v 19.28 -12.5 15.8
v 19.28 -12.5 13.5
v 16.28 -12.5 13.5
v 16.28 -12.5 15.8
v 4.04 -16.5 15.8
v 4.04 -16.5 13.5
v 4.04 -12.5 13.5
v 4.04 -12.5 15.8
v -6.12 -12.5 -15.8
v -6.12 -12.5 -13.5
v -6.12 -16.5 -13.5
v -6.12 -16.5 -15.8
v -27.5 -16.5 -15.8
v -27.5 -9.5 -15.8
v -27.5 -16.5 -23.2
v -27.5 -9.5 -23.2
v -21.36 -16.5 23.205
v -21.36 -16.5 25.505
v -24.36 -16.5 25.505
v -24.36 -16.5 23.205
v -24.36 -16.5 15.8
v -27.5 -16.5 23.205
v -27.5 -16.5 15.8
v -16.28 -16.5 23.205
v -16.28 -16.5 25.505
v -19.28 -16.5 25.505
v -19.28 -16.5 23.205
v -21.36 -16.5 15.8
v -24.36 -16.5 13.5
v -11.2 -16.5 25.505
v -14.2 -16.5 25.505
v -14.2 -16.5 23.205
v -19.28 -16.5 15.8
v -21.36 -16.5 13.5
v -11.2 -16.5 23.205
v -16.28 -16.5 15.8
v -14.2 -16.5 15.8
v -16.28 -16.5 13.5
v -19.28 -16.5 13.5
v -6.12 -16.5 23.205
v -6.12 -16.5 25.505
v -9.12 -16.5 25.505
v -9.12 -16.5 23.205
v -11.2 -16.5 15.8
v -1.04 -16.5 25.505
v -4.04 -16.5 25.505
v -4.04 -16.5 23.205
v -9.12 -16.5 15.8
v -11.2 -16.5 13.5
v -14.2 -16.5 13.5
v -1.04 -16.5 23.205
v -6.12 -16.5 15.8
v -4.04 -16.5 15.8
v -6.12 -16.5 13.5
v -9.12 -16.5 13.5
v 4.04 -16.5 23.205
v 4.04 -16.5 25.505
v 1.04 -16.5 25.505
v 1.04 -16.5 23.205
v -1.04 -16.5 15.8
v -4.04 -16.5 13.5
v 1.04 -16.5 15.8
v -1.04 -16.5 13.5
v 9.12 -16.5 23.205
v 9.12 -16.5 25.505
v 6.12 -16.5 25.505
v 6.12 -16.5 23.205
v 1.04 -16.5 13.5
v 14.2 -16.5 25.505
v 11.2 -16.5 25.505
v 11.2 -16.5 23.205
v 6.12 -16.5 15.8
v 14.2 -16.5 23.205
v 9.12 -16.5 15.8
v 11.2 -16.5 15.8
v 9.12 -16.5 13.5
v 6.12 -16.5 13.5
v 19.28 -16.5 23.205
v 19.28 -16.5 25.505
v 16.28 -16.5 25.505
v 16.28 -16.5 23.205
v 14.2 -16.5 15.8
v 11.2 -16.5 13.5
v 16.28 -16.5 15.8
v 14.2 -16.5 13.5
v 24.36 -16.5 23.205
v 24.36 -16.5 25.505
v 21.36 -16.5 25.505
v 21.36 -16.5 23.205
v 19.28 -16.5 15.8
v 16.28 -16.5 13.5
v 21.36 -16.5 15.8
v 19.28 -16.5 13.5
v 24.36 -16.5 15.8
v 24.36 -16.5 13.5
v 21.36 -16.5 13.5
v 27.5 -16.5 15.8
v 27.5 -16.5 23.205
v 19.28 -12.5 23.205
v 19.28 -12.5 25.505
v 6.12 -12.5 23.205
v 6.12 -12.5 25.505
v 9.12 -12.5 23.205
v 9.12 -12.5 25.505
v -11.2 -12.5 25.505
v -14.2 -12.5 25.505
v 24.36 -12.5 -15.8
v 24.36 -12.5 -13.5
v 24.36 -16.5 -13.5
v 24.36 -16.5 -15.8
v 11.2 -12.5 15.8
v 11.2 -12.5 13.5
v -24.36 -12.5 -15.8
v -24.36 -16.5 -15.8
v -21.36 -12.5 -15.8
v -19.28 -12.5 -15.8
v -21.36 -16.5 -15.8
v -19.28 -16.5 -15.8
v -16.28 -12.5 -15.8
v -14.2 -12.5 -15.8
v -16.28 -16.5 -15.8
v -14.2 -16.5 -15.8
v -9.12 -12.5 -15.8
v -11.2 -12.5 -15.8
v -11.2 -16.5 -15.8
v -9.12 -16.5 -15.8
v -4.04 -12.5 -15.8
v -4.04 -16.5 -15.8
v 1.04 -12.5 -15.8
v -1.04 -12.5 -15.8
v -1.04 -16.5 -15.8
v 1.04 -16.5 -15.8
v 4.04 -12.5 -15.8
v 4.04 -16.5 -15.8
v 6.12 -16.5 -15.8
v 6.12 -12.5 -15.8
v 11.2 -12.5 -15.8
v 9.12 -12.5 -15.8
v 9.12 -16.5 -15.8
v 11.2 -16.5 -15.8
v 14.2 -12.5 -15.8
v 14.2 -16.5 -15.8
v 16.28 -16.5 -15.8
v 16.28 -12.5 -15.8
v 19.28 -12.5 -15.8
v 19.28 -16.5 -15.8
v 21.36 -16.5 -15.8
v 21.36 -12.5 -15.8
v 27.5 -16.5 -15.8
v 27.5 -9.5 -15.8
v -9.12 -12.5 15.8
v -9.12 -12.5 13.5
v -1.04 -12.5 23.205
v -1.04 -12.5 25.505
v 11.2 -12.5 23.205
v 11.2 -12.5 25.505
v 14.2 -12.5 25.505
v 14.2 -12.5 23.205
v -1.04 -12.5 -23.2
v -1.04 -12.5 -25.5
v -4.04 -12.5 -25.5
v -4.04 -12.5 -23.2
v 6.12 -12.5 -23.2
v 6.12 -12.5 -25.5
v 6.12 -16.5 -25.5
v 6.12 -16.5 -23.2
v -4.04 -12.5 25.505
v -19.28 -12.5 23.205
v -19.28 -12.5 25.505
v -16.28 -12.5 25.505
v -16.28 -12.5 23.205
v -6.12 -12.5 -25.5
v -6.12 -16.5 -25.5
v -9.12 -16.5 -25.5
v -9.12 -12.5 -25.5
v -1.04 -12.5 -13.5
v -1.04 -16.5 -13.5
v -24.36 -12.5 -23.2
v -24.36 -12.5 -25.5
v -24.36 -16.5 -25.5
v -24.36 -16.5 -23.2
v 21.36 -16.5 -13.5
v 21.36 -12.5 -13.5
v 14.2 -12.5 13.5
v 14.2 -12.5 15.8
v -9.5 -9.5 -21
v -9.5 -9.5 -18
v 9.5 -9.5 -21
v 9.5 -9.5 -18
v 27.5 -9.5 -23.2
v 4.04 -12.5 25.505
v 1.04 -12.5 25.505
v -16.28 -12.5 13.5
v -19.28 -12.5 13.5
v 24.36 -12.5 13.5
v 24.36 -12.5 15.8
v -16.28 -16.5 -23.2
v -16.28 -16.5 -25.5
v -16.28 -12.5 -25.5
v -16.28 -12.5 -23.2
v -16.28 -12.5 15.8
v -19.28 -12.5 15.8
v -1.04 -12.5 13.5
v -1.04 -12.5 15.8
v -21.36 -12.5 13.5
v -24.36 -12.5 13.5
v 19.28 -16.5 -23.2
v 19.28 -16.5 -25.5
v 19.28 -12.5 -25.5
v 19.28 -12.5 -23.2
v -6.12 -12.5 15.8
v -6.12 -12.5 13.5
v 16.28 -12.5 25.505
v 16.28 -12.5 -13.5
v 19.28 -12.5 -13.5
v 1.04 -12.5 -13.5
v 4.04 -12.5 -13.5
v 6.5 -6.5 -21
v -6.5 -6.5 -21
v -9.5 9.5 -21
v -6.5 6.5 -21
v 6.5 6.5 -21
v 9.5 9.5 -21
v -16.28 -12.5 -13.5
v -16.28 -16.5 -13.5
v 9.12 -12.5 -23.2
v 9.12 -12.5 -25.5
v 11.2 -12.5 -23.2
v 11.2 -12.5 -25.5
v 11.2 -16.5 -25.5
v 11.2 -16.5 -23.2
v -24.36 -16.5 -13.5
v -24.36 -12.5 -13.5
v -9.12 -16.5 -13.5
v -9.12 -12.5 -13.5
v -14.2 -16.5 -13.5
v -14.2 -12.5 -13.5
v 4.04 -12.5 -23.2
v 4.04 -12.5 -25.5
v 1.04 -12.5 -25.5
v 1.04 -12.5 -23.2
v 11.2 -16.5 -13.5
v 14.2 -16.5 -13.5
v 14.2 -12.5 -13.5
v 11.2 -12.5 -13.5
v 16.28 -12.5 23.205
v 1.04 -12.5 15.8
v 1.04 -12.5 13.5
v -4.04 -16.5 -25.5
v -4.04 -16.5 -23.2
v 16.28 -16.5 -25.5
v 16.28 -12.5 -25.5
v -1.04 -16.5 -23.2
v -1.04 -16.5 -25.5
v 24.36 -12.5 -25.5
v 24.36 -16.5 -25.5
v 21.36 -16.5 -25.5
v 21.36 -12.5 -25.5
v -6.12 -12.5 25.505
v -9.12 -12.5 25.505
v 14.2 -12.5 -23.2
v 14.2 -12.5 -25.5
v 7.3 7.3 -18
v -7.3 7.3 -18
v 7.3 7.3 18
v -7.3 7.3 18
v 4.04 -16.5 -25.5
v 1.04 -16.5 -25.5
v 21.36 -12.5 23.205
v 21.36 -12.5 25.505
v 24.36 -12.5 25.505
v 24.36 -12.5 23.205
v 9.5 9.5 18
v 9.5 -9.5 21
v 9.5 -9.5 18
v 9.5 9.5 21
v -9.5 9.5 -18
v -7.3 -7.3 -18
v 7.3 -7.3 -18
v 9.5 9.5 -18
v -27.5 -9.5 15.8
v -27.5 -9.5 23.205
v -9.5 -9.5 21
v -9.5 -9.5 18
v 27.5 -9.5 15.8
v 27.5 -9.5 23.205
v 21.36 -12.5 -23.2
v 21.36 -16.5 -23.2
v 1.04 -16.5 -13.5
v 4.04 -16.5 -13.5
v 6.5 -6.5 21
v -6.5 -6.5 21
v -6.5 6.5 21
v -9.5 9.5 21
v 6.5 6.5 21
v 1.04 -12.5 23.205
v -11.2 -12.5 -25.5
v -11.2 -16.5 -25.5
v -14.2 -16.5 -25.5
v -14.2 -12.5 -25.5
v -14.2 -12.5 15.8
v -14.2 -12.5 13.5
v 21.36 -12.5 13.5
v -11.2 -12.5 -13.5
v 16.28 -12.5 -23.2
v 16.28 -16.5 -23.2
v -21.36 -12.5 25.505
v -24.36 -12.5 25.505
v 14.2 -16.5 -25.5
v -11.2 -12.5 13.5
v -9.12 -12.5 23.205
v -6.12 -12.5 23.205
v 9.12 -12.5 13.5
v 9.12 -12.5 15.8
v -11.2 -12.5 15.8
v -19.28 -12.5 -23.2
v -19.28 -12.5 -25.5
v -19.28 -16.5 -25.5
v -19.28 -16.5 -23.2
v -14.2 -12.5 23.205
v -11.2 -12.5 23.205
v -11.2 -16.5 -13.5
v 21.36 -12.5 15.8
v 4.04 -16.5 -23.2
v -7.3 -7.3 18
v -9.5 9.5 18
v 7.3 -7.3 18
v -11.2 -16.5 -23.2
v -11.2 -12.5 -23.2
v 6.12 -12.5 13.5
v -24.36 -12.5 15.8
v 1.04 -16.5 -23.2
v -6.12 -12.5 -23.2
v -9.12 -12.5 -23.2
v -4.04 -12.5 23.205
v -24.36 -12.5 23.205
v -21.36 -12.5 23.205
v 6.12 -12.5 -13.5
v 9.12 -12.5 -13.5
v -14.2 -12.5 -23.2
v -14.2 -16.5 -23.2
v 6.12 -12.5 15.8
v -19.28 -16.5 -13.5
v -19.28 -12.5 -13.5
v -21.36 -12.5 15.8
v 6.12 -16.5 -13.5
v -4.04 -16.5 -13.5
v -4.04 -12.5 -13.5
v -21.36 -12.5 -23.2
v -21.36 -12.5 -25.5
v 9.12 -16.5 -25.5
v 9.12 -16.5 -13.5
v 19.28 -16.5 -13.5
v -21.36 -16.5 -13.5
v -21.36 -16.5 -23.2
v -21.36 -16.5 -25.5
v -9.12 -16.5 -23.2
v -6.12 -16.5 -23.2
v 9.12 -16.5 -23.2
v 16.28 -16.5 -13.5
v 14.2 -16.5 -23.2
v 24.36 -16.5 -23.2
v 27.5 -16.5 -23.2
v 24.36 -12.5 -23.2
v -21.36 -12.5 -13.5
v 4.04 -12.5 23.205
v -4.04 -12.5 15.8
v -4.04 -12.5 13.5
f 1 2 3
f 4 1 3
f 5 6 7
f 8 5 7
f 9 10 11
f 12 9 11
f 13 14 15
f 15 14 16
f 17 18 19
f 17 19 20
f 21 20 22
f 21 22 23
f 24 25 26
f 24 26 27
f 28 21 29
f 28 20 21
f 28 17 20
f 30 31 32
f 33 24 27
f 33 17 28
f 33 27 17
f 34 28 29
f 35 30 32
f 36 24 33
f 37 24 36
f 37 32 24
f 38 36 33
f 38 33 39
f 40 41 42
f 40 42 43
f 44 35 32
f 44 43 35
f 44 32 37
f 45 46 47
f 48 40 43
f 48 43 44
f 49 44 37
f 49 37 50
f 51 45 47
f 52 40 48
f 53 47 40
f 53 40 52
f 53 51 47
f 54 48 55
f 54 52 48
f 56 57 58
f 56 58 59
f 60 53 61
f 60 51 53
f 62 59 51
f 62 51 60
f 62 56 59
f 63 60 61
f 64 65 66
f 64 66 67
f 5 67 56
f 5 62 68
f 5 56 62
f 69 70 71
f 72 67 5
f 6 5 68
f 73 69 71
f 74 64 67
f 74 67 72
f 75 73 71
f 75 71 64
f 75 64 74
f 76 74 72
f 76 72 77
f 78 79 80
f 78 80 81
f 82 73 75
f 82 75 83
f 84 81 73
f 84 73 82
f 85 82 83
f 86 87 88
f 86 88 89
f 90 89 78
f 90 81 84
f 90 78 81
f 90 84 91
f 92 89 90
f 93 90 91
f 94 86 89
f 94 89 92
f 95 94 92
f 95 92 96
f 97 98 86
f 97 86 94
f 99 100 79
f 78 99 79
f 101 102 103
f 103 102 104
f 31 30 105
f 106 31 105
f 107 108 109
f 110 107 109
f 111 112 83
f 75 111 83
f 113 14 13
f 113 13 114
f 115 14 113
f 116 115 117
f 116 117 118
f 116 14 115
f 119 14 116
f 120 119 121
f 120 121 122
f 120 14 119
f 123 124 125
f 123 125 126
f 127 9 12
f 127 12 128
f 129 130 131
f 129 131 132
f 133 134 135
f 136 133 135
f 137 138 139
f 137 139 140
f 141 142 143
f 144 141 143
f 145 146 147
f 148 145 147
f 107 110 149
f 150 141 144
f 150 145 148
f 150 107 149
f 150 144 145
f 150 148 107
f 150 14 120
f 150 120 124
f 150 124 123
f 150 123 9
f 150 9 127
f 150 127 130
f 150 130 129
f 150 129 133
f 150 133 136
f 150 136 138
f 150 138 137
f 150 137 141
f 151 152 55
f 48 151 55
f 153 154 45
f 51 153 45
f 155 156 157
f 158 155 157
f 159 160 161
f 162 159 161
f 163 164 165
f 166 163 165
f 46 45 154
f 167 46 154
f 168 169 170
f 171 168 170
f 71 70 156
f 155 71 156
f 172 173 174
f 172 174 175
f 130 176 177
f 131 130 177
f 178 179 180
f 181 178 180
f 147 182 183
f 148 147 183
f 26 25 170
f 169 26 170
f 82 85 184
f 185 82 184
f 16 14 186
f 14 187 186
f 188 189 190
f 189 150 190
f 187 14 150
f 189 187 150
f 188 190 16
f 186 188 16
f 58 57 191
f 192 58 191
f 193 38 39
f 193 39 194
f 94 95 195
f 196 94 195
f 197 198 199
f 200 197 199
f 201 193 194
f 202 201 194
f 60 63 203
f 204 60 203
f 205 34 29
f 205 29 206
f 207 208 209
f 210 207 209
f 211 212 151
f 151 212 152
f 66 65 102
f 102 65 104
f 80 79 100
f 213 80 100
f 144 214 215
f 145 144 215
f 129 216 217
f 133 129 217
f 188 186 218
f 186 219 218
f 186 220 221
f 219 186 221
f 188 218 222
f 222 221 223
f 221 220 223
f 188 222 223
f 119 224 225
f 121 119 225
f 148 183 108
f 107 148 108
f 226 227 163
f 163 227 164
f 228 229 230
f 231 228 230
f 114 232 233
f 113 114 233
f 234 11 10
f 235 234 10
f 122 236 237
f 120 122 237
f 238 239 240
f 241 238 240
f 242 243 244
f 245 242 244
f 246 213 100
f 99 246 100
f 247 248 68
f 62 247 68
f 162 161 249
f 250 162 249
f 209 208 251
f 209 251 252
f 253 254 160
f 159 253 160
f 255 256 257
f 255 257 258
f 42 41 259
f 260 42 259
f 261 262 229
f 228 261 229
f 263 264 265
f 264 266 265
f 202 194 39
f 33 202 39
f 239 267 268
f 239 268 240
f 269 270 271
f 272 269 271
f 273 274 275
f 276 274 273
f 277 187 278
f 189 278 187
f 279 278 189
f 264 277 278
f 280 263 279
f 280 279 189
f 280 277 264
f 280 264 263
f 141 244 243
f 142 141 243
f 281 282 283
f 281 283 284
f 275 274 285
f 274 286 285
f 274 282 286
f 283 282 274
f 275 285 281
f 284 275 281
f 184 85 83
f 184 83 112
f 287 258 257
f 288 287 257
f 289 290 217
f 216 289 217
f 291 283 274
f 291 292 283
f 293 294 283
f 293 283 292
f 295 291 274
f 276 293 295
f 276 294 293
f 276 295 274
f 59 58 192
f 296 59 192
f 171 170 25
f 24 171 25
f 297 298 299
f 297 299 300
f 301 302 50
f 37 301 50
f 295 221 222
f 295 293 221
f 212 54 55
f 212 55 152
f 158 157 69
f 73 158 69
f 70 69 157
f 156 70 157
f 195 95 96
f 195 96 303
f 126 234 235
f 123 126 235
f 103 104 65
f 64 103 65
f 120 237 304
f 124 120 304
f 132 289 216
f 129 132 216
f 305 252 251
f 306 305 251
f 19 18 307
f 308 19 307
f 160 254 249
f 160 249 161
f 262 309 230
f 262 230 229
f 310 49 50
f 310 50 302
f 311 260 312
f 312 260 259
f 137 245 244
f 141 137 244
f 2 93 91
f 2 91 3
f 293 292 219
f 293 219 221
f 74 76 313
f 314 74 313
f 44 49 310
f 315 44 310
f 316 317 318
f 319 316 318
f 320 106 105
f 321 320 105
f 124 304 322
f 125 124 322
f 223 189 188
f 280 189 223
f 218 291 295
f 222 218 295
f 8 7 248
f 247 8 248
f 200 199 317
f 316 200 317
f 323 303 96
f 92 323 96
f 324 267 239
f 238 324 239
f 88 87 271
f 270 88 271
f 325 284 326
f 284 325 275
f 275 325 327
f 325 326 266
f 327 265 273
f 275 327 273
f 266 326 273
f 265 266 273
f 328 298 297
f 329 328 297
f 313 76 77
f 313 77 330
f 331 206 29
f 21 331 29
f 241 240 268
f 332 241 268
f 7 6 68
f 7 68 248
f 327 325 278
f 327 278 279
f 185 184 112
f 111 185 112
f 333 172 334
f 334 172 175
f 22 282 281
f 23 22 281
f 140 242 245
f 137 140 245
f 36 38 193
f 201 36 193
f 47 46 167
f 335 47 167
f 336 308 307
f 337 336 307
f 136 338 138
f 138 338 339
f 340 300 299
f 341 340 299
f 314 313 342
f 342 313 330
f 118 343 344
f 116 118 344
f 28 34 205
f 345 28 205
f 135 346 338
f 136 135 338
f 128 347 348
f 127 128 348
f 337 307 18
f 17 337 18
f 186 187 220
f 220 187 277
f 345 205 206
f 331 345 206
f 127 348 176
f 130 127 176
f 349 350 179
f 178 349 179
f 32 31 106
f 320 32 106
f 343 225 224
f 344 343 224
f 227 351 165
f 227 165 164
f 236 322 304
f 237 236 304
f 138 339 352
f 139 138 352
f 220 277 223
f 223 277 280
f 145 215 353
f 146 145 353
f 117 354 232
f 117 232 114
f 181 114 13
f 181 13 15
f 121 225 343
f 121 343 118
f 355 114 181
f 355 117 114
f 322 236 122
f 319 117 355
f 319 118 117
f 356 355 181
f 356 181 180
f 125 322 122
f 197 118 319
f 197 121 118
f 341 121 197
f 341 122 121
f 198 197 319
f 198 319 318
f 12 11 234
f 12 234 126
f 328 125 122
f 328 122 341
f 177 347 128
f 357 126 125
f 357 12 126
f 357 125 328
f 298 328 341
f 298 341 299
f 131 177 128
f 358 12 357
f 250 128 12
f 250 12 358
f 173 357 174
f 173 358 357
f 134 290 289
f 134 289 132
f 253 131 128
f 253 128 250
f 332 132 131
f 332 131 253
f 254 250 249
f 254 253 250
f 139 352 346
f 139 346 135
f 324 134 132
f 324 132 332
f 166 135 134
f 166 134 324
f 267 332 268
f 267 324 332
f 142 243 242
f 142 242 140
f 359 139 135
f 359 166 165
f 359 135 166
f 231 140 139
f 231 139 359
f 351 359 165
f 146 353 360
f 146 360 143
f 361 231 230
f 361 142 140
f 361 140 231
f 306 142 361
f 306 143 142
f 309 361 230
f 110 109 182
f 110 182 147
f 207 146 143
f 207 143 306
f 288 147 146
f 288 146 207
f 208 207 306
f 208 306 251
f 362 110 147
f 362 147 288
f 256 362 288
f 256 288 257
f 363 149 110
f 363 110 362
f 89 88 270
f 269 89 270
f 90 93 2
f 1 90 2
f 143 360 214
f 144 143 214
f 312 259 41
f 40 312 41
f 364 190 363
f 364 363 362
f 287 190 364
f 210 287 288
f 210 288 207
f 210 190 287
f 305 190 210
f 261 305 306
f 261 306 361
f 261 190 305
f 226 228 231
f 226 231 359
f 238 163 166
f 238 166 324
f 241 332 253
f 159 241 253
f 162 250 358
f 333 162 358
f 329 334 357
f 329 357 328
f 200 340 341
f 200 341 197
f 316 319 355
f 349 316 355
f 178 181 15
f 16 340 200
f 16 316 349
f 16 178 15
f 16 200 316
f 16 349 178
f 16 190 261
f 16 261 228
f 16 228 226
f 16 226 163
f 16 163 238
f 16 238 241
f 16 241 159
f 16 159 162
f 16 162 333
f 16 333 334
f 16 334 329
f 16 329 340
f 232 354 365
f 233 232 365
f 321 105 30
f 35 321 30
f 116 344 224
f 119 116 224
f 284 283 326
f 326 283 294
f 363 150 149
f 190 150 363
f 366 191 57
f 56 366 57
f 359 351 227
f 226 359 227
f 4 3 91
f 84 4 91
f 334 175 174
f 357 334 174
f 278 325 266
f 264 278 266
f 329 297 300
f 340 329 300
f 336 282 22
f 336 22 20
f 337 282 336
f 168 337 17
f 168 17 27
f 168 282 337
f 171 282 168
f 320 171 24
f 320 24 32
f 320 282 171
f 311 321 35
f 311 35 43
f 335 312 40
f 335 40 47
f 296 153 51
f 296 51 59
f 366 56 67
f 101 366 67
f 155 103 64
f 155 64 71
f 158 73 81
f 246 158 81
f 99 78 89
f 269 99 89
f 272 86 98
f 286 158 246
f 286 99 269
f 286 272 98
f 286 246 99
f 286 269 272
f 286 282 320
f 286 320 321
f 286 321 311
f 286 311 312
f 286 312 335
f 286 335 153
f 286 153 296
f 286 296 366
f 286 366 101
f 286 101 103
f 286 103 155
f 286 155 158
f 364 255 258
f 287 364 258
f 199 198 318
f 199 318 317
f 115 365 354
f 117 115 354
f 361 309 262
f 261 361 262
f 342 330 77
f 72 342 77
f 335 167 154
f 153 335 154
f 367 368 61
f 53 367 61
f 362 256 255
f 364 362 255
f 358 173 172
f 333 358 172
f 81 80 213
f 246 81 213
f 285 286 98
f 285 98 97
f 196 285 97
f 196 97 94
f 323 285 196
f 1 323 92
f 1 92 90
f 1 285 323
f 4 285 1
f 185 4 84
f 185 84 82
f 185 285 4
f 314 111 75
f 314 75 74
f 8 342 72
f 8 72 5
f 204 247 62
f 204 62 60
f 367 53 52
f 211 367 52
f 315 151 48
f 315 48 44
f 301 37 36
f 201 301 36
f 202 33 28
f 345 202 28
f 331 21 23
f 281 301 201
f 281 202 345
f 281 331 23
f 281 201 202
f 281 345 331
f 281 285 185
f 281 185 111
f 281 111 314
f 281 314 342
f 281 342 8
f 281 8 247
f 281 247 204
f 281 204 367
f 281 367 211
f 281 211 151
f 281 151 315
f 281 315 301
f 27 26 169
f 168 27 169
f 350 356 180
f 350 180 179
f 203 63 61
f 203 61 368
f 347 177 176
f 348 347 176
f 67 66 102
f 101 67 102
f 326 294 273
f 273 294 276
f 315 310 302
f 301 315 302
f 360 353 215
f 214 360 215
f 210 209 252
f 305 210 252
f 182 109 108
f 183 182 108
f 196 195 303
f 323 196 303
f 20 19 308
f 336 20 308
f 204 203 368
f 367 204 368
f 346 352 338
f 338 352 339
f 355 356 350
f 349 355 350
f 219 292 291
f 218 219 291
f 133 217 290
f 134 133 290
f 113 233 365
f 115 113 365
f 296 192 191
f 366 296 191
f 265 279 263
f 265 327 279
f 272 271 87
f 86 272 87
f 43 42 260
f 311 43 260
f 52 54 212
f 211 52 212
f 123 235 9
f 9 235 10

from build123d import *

# Parameters (mm, degrees)
EXTRUDE_1_DEPTH      = 21
SKETCH_1_3_W         = 13
SKETCH_1_3_H         = 13
CUT_EXTRUDE_1_DEPTH  = 21
SKETCH_1_12_W        = 19
SKETCH_1_12_H        = 19
SKETCH_1_12_W_2      = 14.6
SKETCH_1_12_H_2      = 14.6
SKETCH_1_12_W_3      = 13
SKETCH_1_12_H_3      = 13
CUT_EXTRUDE_6_DEPTH  = 18
CUT_EXTRUDE_7_DEPTH  = 14.5
SKETCH_4_W           = 3.504900739
SKETCH_4_H           = 7
SKETCH_4_W_2         = 3.5
EXTRUDE_2_DEPTH      = 27.5
SKETCH_10_W          = 1
SKETCH_10_H          = 7
EXTRUDE_4_DEPTH      = 55
SKETCH_14_W          = 1
SKETCH_14_H          = 7
EXTRUDE_6_DEPTH      = 55
CUT_EXTRUDE_17_DEPTH = 2.3
CUT_EXTRUDE_18_DEPTH = 2.3
CUT_EXTRUDE_19_DEPTH = 2.3
CUT_EXTRUDE_20_DEPTH = 2.3


with BuildPart() as part:
    # 草图1 → 凸台-拉伸1 (new, symmetric)
    with BuildSketch(Plane.XY):
        Polygon((9.5, 9.5), (-9.5, 9.5), (-9.5, -9.5), (-27.5, -9.5), (-27.5, -16.5), (27.5, -16.5), (27.5, -9.5), (9.5, -9.5), align=None)
    extrude(amount=EXTRUDE_1_DEPTH, both=True)

    # 草图1<3> → 切除-拉伸1 (cut, symmetric)
    with BuildSketch(Plane.XY):
        Rectangle(SKETCH_1_3_W, SKETCH_1_3_H)
    extrude(amount=CUT_EXTRUDE_1_DEPTH, both=True, mode=Mode.SUBTRACT)

    # 草图1<12> → 切除-拉伸6 (cut, symmetric)
    # profile 1 of 2: a face of its own
    with BuildSketch(Plane.XY):
        Rectangle(SKETCH_1_12_W, SKETCH_1_12_H)
        Rectangle(SKETCH_1_12_W_2, SKETCH_1_12_H_2, mode=Mode.SUBTRACT)
    # profile 2 of 2: a face of its own
    with BuildSketch(Plane.XY):
        Rectangle(SKETCH_1_12_W_3, SKETCH_1_12_H_3)
    extrude(amount=CUT_EXTRUDE_6_DEPTH, both=True, mode=Mode.SUBTRACT)

    # 草图1<13> → 切除-拉伸7 (cut, symmetric)
    with BuildSketch(Plane.XY):
        Polygon((9.5, -9.5), (-9.5, -9.5), (-27.5, -9.5), (-27.5, -16.5), (27.5, -16.5), (27.5, -9.5), align=None)
    extrude(amount=CUT_EXTRUDE_7_DEPTH, both=True, mode=Mode.SUBTRACT)

    # 草图4 → 凸台-拉伸2 (add, symmetric)
    with BuildSketch(Plane(origin=(0, 0, 0), x_dir=(0, 0, -1), z_dir=(1, 0, 0))):
        with Locations((-22.752450369, -13)):
            Rectangle(SKETCH_4_W, SKETCH_4_H)
        with Locations((22.75, -13)):
            Rectangle(SKETCH_4_W_2, SKETCH_4_H)
    extrude(amount=EXTRUDE_2_DEPTH, both=True)

    # 草图10 → 凸台-拉伸4 (add)
    with BuildSketch(Plane(origin=(27.5, 0, 0), x_dir=(0, 0, -1), z_dir=(1, 0, 0))):
        with Locations((-25.004900739, -13)):
            Rectangle(SKETCH_10_W, SKETCH_10_H)
        with Locations((-14, -13)):
            Rectangle(SKETCH_10_W, SKETCH_10_H)
    extrude(amount=-EXTRUDE_4_DEPTH)

    # 草图14 → 凸台-拉伸6 (add)
    with BuildSketch(Plane(origin=(27.5, 0, 0), x_dir=(0, 0, -1), z_dir=(1, 0, 0))):
        with Locations((14, -13)):
            Rectangle(SKETCH_14_W, SKETCH_14_H)
        with Locations((25, -13)):
            Rectangle(SKETCH_14_W, SKETCH_14_H)
    extrude(amount=-EXTRUDE_6_DEPTH)

    # 草图15 → 切除-拉伸17 (cut)
    with BuildSketch(Plane(origin=(0, 0, -25.5), x_dir=(-1, 0, 0), z_dir=(0, 0, -1))):
        Polygon((-27.5, -9.5), (-27.5, -16.5), (-24.36, -16.5), (-24.36, -12.5), (-22.86, -12.5), (-21.36, -12.5), (-21.36, -16.5), (-19.28, -16.5), (-19.28, -12.5), (-17.78, -12.5), (-16.28, -12.5), (-16.28, -16.5), (-14.2, -16.5), (-14.2, -12.5), (-12.7, -12.5), (-11.2, -12.5), (-11.2, -16.5), (-9.12, -16.5), (-9.12, -12.5), (-7.62, -12.5), (-6.12, -12.5), (-6.12, -16.5), (-4.04, -16.5), (-4.04, -12.5), (-2.54, -12.5), (-1.04, -12.5), (-1.04, -16.5), (1.04, -16.5), (1.04, -12.5), (2.54, -12.5), (4.04, -12.5), (4.04, -16.5), (6.12, -16.5), (6.12, -12.5), (7.62, -12.5), (9.12, -12.5), (9.12, -16.5), (11.2, -16.5), (11.2, -12.5), (12.7, -12.5), (14.2, -12.5), (14.2, -16.5), (16.28, -16.5), (16.28, -12.5), (17.78, -12.5), (19.28, -12.5), (19.28, -16.5), (21.36, -16.5), (21.36, -12.5), (22.86, -12.5), (24.36, -12.5), (24.36, -16.5), (27.5, -16.5), (27.5, -9.5), align=None)
    extrude(amount=-CUT_EXTRUDE_17_DEPTH, mode=Mode.SUBTRACT)

    # 草图16 → 切除-拉伸18 (cut)
    with BuildSketch(Plane(origin=(0, 0, 13.5), x_dir=(-1, 0, 0), z_dir=(0, 0, -1))):
        Polygon((27.5, -9.5), (-27.5, -9.5), (-27.5, -16.5), (-24.36, -16.5), (-24.36, -12.5), (-21.36, -12.5), (-21.36, -16.5), (-19.28, -16.5), (-19.28, -12.5), (-16.28, -12.5), (-16.28, -16.5), (-14.2, -16.5), (-14.2, -12.5), (-11.2, -12.5), (-11.2, -16.5), (-9.12, -16.5), (-9.12, -12.5), (-6.12, -12.5), (-6.12, -16.5), (-4.04, -16.5), (-4.04, -12.5), (-1.04, -12.5), (-1.04, -16.5), (1.04, -16.5), (1.04, -12.5), (4.04, -12.5), (4.04, -16.5), (6.12, -16.5), (6.12, -12.5), (9.12, -12.5), (9.12, -16.5), (11.2, -16.5), (11.2, -12.5), (14.2, -12.5), (14.2, -16.5), (16.28, -16.5), (16.28, -12.5), (19.28, -12.5), (19.28, -16.5), (21.36, -16.5), (21.36, -12.5), (24.36, -12.5), (24.36, -16.5), (27.5, -16.5), align=None)
    extrude(amount=-CUT_EXTRUDE_18_DEPTH, mode=Mode.SUBTRACT)

    # 草图17 → 切除-拉伸19 (cut)
    with BuildSketch(Plane.XY.offset(-13.5)):
        Polygon((24.36, -16.5), (27.5, -16.5), (27.5, -9.5), (-27.5, -9.5), (-27.5, -16.5), (-24.36, -16.5), (-24.36, -12.5), (-21.36, -12.5), (-21.36, -16.5), (-19.28, -16.5), (-19.28, -12.5), (-16.28, -12.5), (-16.28, -16.5), (-14.2, -16.5), (-14.2, -12.5), (-11.2, -12.5), (-11.2, -16.5), (-9.12, -16.5), (-9.12, -12.5), (-6.12, -12.5), (-6.12, -16.5), (-4.04, -16.5), (-4.04, -12.5), (-1.04, -12.5), (-1.04, -16.5), (1.04, -16.5), (1.04, -12.5), (4.04, -12.5), (4.04, -16.5), (6.12, -16.5), (6.12, -12.5), (9.12, -12.5), (9.12, -16.5), (11.2, -16.5), (11.2, -12.5), (14.2, -12.5), (14.2, -16.5), (16.28, -16.5), (16.28, -12.5), (19.28, -12.5), (19.28, -16.5), (21.36, -16.5), (21.36, -12.5), (24.36, -12.5), align=None)
    extrude(amount=-CUT_EXTRUDE_19_DEPTH, mode=Mode.SUBTRACT)

    # 草图18 → 切除-拉伸20 (cut)
    with BuildSketch(Plane.XY.offset(25.504900739)):
        Polygon((24.36, -16.5), (27.5, -16.5), (27.5, -9.5), (-27.5, -9.5), (-27.5, -16.5), (-24.36, -16.5), (-24.36, -12.5), (-21.36, -12.5), (-21.36, -16.5), (-19.28, -16.5), (-19.28, -12.5), (-16.28, -12.5), (-16.28, -16.5), (-14.2, -16.5), (-14.2, -12.5), (-11.2, -12.5), (-11.2, -16.5), (-9.12, -16.5), (-9.12, -12.5), (-6.12, -12.5), (-6.12, -16.5), (-4.04, -16.5), (-4.04, -12.5), (-1.04, -12.5), (-1.04, -16.5), (1.04, -16.5), (1.04, -12.5), (4.04, -12.5), (4.04, -16.5), (6.12, -16.5), (6.12, -12.5), (9.12, -12.5), (9.12, -16.5), (11.2, -16.5), (11.2, -12.5), (14.2, -12.5), (14.2, -16.5), (16.28, -16.5), (16.28, -12.5), (19.28, -12.5), (19.28, -16.5), (21.36, -16.5), (21.36, -12.5), (24.36, -12.5), align=None)
    extrude(amount=-CUT_EXTRUDE_20_DEPTH, mode=Mode.SUBTRACT)


solid = part.part
